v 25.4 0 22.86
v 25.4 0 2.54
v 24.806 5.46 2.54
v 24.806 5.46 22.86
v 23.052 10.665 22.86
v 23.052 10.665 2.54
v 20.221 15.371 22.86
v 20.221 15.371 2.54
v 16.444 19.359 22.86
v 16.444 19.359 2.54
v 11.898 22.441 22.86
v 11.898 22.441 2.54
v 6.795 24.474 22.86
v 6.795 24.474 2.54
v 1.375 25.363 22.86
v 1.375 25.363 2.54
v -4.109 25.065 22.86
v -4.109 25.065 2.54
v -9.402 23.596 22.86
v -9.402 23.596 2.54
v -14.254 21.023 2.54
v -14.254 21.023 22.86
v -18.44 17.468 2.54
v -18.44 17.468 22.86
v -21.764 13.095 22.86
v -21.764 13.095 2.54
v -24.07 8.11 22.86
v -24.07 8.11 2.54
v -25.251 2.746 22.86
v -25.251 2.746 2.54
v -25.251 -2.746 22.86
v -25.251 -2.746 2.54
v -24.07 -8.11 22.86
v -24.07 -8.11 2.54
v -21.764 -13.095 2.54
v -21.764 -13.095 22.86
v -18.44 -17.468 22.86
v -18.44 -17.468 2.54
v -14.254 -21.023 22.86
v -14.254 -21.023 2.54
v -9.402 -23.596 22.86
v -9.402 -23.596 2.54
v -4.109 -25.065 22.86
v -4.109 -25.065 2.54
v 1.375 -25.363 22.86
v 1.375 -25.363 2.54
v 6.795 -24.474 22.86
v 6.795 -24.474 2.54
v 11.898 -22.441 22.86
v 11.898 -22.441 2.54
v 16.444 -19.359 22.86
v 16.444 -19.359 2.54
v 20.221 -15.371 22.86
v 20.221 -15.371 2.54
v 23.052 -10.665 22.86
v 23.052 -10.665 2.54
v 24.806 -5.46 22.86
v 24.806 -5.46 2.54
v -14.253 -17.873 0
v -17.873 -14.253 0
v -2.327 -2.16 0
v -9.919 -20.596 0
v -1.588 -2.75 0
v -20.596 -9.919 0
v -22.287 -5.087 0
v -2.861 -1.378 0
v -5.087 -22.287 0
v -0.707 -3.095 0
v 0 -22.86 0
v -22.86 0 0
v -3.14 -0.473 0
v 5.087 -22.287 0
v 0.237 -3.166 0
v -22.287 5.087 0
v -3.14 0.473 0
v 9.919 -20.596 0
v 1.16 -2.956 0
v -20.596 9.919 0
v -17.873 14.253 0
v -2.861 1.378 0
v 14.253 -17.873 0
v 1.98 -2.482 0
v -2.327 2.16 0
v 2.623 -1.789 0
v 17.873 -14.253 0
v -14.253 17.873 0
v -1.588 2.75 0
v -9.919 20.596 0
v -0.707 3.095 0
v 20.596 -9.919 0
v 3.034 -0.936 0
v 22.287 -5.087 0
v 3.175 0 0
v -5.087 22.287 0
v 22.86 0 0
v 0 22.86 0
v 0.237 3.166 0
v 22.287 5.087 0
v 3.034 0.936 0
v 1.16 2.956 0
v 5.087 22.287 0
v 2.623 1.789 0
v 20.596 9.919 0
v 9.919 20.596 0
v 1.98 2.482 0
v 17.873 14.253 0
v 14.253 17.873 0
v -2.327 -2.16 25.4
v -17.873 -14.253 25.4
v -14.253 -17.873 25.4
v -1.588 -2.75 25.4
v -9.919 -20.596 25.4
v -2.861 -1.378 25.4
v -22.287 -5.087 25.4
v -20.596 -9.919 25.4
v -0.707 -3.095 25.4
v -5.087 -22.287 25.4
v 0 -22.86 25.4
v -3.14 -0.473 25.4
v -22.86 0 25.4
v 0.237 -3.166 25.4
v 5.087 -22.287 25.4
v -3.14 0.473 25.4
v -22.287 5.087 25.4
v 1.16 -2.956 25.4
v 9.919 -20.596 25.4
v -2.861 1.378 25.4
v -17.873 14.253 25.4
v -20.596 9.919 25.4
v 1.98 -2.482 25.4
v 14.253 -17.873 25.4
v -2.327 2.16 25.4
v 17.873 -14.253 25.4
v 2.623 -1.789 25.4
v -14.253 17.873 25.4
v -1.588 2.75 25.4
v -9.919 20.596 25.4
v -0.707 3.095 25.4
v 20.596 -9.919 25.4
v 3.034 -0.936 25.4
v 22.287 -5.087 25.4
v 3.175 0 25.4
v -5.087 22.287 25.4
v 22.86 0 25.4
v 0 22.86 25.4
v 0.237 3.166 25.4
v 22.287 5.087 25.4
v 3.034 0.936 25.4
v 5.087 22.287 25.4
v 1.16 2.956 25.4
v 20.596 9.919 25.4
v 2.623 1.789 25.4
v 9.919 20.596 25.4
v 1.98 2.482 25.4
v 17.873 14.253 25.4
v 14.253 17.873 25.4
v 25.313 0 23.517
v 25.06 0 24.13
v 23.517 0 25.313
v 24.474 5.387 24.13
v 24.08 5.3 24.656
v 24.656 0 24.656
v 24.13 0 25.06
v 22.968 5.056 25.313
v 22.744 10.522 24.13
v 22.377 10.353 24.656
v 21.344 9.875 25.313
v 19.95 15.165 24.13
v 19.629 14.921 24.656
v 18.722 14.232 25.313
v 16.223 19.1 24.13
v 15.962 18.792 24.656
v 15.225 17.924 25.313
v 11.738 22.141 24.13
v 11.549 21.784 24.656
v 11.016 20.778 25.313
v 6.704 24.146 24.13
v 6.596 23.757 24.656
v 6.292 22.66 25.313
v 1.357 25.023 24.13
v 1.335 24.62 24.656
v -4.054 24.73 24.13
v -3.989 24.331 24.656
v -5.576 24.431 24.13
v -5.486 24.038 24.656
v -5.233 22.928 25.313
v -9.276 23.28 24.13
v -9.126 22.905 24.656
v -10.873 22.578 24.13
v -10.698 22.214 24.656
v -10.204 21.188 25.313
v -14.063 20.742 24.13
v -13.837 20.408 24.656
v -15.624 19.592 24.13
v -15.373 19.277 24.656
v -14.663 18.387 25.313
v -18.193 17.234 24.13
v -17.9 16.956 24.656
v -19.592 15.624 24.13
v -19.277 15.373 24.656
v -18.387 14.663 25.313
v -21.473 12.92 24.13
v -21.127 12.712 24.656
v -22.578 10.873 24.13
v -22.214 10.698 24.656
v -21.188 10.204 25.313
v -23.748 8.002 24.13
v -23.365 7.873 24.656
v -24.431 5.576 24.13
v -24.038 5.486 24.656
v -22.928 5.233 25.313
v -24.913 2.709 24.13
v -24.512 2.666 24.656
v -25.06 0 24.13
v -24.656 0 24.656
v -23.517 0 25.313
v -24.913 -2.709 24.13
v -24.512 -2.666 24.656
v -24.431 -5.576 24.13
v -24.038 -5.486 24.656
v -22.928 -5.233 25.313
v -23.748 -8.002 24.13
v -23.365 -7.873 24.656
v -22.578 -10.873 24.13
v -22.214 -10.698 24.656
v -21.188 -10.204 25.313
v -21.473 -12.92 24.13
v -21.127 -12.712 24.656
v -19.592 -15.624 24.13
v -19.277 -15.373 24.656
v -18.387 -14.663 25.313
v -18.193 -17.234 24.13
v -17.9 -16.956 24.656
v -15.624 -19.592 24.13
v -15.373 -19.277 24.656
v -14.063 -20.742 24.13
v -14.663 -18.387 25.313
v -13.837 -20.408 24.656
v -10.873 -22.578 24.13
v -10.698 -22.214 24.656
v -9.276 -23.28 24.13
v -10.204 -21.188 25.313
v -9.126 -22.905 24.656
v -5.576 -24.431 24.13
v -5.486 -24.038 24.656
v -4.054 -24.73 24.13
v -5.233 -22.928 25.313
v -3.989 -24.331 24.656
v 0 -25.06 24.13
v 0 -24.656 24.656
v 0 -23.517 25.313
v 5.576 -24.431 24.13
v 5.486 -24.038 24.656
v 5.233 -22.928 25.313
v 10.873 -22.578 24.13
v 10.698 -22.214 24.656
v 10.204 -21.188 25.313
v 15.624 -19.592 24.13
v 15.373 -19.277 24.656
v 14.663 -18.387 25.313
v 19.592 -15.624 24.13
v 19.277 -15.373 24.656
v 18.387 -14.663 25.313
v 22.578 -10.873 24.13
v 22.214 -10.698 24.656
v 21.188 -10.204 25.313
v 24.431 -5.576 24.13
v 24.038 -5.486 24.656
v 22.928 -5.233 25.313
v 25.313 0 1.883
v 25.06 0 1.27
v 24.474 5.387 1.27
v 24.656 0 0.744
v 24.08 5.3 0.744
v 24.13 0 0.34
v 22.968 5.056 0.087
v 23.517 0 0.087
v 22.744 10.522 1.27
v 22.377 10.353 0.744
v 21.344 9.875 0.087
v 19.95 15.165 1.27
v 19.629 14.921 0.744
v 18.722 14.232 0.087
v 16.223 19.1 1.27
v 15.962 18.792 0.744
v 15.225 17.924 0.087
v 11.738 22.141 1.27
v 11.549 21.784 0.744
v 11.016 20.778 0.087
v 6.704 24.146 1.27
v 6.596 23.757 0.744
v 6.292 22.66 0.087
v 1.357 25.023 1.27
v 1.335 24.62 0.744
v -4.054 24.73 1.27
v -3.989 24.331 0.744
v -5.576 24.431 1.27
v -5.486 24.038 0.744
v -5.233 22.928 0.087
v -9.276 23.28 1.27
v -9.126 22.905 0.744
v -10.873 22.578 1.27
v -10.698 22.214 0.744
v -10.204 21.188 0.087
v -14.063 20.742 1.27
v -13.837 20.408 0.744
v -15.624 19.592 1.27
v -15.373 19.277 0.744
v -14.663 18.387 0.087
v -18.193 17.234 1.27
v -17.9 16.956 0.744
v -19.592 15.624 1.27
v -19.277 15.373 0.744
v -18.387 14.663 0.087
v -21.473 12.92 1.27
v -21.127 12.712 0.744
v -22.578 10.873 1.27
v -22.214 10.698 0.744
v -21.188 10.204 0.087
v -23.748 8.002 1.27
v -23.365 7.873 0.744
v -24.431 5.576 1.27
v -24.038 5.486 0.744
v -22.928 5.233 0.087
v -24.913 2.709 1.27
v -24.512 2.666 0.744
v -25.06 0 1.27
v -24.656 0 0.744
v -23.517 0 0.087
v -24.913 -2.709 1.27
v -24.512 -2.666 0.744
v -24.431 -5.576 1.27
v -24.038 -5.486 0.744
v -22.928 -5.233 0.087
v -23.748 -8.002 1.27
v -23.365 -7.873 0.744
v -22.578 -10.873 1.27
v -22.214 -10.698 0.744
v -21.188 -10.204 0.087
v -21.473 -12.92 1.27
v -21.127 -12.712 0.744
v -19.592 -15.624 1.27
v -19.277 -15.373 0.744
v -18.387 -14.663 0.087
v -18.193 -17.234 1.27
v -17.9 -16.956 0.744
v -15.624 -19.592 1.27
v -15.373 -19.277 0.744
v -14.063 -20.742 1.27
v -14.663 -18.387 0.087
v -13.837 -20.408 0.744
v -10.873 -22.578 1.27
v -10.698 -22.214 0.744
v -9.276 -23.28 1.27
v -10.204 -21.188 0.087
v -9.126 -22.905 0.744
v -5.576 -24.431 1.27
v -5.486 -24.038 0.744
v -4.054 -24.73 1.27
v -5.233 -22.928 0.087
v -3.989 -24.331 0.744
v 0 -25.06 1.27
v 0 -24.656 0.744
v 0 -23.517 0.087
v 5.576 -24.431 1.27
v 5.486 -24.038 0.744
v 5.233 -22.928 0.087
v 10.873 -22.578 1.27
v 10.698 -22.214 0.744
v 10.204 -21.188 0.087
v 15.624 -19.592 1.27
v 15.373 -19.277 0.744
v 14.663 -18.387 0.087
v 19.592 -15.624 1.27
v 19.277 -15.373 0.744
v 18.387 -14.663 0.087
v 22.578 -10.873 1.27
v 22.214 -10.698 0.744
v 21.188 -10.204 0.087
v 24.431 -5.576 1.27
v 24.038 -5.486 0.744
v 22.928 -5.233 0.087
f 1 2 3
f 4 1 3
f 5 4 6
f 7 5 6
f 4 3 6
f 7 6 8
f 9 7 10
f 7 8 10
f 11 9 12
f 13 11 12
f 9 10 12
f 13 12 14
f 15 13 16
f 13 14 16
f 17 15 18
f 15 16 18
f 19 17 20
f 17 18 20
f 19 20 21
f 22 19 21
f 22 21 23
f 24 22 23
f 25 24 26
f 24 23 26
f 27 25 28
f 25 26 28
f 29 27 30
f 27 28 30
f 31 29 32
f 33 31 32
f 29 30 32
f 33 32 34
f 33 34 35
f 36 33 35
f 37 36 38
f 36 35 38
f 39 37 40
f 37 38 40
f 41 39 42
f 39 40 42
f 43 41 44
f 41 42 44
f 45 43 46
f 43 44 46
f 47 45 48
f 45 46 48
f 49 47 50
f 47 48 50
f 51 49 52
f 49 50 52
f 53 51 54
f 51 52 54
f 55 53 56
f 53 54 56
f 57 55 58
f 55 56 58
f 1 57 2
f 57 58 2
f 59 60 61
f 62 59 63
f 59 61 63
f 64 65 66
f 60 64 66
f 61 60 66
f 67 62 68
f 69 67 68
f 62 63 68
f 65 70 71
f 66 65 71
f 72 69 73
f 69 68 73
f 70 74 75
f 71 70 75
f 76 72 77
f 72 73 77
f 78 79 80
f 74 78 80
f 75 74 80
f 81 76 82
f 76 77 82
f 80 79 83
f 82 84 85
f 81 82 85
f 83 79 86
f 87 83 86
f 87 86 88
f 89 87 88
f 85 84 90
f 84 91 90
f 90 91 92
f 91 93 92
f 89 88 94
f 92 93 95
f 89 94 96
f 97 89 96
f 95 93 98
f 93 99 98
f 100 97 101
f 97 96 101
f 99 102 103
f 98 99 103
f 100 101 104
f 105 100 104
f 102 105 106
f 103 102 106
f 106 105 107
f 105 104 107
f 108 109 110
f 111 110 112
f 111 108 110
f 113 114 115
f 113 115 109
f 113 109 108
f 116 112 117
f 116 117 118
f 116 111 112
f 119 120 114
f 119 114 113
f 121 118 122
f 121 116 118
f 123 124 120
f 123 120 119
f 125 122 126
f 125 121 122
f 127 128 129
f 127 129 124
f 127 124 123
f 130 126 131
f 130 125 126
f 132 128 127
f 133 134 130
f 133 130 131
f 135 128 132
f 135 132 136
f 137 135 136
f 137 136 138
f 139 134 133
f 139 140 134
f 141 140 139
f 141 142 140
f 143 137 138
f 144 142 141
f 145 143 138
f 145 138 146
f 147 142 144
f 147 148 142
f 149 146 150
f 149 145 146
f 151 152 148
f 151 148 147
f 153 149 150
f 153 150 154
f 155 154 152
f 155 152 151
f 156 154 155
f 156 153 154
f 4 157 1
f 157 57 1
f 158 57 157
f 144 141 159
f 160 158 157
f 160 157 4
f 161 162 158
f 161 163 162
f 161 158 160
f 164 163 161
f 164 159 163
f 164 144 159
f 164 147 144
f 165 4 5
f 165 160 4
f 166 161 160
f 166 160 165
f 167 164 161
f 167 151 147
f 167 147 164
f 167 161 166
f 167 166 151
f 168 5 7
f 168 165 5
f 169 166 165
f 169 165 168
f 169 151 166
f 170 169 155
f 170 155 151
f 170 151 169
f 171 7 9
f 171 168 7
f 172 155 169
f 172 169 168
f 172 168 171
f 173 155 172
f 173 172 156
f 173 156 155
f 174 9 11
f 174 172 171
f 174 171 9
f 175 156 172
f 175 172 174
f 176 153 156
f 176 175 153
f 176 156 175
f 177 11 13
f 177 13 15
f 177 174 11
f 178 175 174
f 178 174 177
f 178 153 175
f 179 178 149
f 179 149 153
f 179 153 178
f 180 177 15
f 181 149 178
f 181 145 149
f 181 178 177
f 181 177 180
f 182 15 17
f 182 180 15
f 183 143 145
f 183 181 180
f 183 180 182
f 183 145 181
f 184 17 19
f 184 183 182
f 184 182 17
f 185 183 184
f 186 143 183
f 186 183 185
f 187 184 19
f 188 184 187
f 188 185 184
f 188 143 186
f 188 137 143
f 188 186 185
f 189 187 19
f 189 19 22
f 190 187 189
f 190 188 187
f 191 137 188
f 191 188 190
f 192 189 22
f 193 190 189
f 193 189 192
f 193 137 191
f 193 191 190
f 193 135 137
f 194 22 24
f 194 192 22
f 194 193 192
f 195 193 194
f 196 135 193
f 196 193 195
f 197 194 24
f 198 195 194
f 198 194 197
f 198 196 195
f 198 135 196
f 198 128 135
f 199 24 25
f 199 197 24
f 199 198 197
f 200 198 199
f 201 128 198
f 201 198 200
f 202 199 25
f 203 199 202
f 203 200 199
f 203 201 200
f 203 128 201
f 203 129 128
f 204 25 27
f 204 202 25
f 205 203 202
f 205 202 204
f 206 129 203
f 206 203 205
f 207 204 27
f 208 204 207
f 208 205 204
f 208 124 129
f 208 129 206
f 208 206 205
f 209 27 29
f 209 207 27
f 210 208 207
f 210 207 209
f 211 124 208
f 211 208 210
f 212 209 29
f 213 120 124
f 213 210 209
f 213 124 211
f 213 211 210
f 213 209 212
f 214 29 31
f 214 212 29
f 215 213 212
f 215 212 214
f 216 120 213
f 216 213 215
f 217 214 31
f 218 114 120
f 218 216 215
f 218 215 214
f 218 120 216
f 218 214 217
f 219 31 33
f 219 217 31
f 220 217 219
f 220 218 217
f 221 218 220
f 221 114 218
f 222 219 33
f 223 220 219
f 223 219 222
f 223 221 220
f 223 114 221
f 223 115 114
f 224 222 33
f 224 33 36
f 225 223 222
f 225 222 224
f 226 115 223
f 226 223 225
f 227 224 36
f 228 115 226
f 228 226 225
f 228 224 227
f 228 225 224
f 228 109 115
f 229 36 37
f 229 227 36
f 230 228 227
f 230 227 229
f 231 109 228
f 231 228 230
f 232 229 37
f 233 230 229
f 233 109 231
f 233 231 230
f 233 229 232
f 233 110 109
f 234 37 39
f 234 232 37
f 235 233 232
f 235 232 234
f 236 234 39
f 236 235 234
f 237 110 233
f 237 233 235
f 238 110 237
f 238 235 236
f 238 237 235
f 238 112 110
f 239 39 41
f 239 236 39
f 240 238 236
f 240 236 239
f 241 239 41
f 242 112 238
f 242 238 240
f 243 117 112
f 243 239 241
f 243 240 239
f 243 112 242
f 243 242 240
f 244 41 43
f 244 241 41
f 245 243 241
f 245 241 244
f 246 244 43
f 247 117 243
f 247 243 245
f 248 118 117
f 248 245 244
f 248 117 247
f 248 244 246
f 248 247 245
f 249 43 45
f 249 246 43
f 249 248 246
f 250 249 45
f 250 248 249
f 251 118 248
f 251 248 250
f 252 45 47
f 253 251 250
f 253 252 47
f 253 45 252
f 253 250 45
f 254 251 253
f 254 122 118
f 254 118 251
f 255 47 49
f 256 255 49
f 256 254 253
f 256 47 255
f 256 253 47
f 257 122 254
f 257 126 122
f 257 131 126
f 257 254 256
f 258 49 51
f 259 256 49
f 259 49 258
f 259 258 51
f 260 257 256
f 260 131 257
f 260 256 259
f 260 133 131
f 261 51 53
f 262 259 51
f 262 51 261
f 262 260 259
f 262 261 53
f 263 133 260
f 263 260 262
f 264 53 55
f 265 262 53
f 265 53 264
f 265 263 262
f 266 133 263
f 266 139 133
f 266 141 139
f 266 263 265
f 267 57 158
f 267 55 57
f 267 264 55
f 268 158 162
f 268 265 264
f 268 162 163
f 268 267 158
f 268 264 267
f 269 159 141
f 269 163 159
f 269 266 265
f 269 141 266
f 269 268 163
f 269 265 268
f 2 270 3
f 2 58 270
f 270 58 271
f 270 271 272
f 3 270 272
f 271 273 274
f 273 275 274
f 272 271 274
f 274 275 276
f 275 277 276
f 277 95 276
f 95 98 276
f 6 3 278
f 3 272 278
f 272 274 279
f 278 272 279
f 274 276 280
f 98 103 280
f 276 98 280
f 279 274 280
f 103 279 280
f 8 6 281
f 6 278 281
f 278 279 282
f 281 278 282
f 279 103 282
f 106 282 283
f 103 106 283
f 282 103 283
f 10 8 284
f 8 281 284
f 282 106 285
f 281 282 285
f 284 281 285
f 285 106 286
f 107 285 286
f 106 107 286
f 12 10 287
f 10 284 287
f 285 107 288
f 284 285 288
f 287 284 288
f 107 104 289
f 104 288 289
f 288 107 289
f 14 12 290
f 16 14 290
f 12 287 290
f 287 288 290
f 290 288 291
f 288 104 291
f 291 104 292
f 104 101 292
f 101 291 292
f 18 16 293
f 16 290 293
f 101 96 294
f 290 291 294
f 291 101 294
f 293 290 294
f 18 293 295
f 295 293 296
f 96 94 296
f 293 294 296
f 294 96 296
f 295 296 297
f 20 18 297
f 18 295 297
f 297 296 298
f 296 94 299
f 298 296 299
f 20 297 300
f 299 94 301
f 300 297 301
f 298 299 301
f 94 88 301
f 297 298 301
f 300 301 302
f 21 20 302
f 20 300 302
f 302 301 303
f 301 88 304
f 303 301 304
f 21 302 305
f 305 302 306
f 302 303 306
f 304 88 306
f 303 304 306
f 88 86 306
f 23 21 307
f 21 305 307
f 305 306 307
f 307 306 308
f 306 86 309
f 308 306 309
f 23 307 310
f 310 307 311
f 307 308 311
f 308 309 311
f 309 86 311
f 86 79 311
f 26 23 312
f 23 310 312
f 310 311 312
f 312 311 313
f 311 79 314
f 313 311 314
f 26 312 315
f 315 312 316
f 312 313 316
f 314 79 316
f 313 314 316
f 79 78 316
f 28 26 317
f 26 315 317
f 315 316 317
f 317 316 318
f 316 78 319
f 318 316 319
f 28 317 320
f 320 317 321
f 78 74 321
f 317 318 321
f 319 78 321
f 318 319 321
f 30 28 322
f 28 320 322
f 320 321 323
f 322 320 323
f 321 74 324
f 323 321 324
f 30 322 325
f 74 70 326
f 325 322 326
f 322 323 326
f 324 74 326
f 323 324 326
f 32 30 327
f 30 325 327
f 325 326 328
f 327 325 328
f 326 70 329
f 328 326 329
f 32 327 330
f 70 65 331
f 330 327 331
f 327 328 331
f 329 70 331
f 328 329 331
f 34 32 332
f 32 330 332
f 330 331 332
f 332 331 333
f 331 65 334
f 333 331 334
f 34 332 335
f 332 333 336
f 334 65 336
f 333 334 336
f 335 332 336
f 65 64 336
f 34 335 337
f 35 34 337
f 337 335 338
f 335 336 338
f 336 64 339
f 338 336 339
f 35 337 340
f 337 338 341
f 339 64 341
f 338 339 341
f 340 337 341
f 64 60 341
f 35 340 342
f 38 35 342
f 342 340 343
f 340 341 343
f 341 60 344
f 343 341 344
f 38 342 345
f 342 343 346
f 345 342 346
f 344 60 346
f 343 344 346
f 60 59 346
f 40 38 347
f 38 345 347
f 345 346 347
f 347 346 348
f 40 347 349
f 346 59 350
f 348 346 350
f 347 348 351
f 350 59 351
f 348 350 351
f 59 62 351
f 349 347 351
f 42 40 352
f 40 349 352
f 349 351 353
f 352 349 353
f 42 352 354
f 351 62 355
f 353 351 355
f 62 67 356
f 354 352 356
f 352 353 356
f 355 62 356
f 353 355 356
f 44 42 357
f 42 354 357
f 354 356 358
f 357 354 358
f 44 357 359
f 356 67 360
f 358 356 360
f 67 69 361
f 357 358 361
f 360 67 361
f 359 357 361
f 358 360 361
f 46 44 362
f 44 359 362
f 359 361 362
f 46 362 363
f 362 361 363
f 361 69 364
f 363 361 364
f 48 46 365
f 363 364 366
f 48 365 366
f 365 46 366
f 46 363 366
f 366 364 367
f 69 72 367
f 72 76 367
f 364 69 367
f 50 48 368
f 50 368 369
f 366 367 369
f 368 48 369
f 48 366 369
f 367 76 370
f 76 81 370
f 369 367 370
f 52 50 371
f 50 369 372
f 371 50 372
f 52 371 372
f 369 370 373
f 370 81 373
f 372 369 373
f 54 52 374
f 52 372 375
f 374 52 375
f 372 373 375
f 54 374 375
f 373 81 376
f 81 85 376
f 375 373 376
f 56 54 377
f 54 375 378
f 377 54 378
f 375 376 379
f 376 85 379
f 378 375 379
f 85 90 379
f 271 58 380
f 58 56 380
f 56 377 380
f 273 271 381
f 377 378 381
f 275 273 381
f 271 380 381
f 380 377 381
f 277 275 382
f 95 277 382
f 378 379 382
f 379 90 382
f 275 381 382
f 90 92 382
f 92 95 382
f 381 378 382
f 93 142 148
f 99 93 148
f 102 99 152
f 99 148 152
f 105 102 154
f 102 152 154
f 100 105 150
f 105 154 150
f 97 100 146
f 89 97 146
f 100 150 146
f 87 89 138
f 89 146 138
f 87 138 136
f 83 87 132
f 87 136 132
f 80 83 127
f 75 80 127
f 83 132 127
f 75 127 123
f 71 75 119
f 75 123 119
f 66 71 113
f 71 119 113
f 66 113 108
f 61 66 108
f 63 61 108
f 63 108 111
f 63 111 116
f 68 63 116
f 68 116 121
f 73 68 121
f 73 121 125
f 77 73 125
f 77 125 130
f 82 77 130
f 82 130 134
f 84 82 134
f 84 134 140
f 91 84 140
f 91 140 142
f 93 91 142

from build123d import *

# Parameters (mm, degrees)
SKETCH1_R           = 25.4
BOSS_EXTRUDE1_DEPTH = 25.4
FILLET1_R           = 2.54
CUT_EXTRUDE1_REACH  = 45.994
SKETCH2_R           = 3.175


with BuildPart() as part:
    # Sketch1 → Boss-Extrude1 (new body)
    with BuildSketch(Plane.XY):
        Circle(SKETCH1_R)
    extrude(amount=BOSS_EXTRUDE1_DEPTH)

    # Fillet1
    fillet1_edges = [part.edges().sort_by_distance(p)[0] for p in [
        (-25.4, 0, 0),
        (-25.4, 0, 25.4),
    ]]
    fillet(fillet1_edges, radius=FILLET1_R)

    # Sketch2 → Cut-Extrude1 (cut, up to next)
    with BuildSketch(Plane.XY.offset(25.4), mode=Mode.PRIVATE) as cut_extrude1_sk1:
        Circle(SKETCH2_R)
    cut_extrude1_tool1 = extrude(cut_extrude1_sk1.sketch, amount=-CUT_EXTRUDE1_REACH, mode=Mode.PRIVATE) & part.part
    add(cut_extrude1_tool1.solids().sort_by_distance((0, 0, 25.4))[0], mode=Mode.SUBTRACT)


solid = part.part
